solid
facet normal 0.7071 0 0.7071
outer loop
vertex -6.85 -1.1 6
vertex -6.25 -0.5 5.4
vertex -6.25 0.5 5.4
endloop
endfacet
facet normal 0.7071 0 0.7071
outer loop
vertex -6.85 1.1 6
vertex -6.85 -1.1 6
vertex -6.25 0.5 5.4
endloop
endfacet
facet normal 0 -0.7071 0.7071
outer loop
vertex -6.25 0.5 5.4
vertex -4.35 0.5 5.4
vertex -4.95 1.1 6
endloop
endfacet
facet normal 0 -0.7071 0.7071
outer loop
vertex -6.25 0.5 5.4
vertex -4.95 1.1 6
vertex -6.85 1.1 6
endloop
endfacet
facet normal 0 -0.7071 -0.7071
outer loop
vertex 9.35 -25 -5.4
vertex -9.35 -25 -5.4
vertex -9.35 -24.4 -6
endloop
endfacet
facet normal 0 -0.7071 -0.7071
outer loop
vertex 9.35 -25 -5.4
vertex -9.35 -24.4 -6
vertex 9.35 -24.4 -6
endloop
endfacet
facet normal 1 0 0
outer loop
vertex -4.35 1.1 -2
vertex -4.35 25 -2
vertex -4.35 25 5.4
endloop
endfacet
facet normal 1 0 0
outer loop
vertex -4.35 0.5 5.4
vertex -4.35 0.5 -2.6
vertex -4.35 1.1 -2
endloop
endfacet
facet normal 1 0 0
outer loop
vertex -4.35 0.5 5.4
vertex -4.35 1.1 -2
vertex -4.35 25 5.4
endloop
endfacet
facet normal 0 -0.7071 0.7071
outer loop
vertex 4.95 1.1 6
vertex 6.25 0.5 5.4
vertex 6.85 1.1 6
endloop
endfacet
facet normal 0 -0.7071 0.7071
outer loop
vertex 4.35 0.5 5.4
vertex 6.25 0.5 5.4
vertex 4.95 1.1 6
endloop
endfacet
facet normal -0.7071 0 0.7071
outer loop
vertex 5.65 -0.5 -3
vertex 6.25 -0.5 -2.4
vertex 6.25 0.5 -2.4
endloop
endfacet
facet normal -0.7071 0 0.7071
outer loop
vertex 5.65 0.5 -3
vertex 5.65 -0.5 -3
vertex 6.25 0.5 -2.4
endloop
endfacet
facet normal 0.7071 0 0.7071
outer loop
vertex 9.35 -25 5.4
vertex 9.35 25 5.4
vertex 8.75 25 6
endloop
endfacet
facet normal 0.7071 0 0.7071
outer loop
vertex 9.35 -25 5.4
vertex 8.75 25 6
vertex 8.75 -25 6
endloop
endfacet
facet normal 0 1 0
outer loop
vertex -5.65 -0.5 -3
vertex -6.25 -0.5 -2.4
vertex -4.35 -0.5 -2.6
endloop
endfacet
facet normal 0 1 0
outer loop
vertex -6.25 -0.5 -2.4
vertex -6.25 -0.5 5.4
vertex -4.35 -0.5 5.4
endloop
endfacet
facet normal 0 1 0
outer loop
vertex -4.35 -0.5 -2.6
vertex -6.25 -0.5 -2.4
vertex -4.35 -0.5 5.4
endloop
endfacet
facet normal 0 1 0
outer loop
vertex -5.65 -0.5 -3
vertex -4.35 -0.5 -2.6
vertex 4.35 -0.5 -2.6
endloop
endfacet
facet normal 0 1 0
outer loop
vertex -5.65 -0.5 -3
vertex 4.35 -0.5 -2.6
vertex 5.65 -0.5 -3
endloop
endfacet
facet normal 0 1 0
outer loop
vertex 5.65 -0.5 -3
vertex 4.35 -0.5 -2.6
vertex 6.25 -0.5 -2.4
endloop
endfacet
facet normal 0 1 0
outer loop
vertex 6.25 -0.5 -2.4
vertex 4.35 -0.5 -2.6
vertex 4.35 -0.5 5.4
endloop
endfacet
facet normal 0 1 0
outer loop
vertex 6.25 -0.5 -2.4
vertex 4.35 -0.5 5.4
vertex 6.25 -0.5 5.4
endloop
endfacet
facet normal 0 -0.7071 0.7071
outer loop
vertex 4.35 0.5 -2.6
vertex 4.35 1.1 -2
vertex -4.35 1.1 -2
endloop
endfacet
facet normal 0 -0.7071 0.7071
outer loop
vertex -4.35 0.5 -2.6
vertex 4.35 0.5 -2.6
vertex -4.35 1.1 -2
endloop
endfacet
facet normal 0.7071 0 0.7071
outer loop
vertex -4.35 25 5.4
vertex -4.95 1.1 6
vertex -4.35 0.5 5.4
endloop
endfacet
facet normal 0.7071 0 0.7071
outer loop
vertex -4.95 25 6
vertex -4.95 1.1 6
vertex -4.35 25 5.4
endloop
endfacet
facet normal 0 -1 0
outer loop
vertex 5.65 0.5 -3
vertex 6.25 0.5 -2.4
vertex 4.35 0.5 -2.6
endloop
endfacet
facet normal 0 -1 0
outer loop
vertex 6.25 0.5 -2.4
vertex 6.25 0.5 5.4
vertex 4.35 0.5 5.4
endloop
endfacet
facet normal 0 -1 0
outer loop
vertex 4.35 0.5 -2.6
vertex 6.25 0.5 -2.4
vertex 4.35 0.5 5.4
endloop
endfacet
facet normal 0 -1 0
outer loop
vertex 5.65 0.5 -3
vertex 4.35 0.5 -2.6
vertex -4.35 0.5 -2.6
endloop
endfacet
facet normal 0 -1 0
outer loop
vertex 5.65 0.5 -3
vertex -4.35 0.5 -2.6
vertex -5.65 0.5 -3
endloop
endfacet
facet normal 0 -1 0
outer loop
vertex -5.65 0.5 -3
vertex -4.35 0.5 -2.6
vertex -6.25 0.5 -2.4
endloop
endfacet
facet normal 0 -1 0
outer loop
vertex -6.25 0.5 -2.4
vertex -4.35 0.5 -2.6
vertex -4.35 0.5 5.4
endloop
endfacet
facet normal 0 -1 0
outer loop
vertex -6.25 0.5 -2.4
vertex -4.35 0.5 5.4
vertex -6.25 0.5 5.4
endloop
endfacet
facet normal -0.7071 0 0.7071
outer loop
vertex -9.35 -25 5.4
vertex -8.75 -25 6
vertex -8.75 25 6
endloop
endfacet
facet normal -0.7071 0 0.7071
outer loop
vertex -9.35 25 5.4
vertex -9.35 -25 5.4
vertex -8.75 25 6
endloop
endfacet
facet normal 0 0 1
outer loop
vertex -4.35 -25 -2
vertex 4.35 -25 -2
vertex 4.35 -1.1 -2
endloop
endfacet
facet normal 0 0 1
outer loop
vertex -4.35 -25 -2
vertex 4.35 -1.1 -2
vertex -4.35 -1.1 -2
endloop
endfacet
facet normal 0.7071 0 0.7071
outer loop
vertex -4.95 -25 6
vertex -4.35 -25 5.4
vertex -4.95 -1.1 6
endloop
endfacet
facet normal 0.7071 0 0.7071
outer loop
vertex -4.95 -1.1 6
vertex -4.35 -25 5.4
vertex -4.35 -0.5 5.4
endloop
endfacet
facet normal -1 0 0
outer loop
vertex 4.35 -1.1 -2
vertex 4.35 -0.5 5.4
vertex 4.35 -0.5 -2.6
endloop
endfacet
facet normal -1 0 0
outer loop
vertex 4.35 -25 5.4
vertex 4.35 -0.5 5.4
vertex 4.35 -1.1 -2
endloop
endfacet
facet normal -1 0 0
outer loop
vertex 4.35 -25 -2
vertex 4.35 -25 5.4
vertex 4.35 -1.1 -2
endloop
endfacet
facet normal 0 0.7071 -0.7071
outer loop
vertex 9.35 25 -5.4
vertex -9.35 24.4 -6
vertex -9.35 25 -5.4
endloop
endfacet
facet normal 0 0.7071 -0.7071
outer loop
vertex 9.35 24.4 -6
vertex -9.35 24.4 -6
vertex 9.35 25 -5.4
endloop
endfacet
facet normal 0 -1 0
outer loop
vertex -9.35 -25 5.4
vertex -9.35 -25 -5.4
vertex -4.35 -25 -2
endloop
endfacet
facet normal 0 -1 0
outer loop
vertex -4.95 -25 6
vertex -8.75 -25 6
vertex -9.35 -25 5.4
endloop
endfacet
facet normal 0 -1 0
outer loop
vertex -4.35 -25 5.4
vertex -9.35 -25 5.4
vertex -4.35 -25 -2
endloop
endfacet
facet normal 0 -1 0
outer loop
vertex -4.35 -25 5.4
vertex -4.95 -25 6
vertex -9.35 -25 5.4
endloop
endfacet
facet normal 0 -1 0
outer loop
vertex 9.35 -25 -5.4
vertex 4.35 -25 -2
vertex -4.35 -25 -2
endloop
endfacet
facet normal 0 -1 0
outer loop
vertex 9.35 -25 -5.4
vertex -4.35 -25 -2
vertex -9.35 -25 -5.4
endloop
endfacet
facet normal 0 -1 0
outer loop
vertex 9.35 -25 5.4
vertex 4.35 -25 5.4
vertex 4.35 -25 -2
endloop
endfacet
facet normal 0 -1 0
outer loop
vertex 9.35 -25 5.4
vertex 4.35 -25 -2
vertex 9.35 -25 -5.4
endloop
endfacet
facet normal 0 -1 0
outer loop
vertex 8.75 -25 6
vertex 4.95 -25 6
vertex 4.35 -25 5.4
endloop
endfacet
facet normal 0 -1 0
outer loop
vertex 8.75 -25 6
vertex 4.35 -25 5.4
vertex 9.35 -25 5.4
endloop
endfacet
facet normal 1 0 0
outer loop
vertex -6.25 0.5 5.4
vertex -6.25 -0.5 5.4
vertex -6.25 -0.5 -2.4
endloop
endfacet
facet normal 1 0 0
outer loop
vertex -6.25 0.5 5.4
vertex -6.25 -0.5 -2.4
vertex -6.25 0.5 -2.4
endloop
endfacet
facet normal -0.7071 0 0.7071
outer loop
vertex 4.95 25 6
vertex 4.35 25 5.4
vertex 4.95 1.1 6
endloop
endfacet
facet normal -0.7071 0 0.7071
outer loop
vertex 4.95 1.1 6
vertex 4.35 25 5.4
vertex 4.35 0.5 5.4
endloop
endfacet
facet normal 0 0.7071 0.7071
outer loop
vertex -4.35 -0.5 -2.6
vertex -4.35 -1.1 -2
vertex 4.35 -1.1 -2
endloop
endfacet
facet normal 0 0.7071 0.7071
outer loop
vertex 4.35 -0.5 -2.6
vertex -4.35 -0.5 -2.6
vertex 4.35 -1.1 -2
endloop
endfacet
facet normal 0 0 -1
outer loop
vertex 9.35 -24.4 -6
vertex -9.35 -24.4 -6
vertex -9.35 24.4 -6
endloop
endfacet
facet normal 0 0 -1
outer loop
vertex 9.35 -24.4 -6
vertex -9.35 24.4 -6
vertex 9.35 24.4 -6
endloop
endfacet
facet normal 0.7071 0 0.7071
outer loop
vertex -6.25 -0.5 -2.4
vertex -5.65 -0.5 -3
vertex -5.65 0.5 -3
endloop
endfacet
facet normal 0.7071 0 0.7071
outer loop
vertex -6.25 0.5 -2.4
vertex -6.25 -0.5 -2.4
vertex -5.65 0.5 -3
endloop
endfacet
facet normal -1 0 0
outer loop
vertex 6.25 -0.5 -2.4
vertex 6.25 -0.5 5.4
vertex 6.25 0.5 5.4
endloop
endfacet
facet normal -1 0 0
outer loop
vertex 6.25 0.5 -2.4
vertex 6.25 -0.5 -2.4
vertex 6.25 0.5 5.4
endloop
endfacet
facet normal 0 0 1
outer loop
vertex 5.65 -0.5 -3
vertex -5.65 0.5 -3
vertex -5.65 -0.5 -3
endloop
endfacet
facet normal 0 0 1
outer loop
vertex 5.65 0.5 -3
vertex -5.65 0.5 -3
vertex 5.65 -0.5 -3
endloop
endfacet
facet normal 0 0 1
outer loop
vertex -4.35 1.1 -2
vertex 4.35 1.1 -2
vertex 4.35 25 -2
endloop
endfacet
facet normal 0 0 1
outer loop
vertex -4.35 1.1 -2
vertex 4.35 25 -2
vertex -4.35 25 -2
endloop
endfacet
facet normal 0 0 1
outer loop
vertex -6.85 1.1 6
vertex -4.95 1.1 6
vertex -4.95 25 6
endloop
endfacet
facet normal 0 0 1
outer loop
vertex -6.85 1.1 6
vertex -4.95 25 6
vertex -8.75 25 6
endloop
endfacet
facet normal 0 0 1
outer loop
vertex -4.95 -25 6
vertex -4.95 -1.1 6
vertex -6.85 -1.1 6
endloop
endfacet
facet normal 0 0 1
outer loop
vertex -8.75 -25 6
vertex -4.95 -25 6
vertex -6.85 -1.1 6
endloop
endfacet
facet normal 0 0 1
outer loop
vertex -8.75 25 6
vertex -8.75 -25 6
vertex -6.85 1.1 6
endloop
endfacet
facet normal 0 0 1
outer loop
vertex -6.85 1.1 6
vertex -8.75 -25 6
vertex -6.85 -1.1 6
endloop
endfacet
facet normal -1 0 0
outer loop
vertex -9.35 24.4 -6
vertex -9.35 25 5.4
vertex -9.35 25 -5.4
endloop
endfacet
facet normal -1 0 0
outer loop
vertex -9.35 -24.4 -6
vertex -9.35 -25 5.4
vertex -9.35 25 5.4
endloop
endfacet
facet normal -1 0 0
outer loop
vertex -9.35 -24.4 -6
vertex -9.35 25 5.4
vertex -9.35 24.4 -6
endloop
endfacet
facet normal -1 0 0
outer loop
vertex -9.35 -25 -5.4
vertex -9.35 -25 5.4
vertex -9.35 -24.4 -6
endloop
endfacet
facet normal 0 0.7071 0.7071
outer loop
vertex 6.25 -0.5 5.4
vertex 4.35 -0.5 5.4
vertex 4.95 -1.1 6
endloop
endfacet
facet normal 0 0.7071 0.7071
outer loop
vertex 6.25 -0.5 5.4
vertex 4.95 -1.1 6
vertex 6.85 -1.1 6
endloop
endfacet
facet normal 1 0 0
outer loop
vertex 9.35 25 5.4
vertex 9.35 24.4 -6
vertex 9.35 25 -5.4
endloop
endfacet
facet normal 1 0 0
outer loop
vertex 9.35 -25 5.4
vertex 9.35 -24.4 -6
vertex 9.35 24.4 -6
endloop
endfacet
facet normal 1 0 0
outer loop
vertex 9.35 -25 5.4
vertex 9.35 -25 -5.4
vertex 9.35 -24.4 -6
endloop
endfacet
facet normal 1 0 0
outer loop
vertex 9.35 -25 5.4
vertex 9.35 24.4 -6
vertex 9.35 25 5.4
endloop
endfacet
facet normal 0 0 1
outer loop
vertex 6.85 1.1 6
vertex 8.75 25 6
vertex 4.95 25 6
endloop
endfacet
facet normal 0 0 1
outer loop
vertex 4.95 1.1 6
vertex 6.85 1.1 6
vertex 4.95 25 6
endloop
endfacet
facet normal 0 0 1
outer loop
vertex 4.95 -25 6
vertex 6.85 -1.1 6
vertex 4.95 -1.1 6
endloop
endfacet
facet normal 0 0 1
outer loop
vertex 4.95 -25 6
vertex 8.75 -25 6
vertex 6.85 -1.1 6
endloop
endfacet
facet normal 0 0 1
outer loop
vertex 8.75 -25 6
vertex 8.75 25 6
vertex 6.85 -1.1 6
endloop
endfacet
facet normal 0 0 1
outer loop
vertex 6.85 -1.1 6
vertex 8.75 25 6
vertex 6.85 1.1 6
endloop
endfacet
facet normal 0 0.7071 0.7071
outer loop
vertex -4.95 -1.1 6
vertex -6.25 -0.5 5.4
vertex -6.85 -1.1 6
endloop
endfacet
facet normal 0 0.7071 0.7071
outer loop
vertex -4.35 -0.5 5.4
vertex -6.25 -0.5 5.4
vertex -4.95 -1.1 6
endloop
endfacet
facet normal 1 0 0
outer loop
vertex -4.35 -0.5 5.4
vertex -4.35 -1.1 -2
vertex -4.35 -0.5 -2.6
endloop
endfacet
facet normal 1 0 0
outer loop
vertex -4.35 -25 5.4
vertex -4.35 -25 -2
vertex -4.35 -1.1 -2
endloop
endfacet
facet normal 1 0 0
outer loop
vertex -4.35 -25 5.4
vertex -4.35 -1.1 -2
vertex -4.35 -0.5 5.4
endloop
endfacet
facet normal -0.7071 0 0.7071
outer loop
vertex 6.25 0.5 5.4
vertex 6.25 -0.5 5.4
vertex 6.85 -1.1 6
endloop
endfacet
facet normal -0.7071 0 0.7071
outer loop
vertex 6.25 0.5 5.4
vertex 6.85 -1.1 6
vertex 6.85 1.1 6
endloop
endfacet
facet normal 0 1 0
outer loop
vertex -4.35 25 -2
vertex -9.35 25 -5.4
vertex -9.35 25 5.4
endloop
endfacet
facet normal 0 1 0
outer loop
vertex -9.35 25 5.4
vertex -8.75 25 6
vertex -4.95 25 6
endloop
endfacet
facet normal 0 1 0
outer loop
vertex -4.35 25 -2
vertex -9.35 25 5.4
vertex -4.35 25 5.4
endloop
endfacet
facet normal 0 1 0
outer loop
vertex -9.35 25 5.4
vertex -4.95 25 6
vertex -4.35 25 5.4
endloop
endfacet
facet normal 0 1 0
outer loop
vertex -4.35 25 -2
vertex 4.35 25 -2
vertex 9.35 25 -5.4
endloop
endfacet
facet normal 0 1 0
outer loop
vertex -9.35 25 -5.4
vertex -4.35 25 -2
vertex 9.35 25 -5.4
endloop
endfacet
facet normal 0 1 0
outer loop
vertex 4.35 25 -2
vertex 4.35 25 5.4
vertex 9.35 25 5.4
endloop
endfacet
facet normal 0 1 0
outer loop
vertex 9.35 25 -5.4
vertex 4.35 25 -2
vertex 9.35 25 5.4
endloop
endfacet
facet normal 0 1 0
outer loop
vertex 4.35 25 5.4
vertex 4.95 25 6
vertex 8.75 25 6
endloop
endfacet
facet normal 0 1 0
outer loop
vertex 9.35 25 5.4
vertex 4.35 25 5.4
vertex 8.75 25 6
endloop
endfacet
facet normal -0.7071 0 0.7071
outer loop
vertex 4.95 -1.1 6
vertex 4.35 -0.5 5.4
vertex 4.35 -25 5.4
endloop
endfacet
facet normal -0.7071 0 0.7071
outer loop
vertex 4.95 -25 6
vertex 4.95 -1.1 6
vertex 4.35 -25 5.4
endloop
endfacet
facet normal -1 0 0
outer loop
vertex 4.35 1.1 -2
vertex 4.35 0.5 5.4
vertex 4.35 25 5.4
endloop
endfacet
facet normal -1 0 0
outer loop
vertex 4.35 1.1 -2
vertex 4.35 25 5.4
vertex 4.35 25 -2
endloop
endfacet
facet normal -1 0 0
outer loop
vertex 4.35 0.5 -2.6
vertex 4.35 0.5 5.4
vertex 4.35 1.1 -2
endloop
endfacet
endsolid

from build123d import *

# Parameters (mm, degrees)
F1_DEPTH = 25
F2_W     = 1.9
F2_H     = 1
F2_W_2   = 10.6
F3_DEPTH = 9
F4_SIZE  = 0.6


with BuildPart() as f1:
    # F0 (on Front) → F1 (new body, symmetric)
    with BuildSketch(Plane.XZ):
        Polygon((-9.35, -6), (9.35, -6), (9.35, 6), (4.35, 6), (4.35, -2), (-4.35, -2), (-4.35, 6), (-9.35, 6), align=None)
    extrude(amount=F1_DEPTH, both=True)

    # F2 (on face) → F3 (cut)
    with BuildSketch(Plane.XY.offset(6)):
        with Locations((5.3, 0)):
            Rectangle(F2_W, F2_H)
        with Locations((-0.95, 0)):
            Rectangle(F2_W_2, F2_H)
    extrude(amount=-F3_DEPTH, mode=Mode.SUBTRACT)

    # F4 (call 1 of 10: OpenCascade refuses the feature's edges together)
    f4_edges = [f1.edges().sort_by_distance(p)[0] for p in [
        (5.3, 0.5, 6),
        (6.25, 0, 6),
        (5.3, -0.5, 6),
        (4.35, 12.75, 6),
        (4.35, -12.75, 6),
    ]]
    chamfer(f4_edges, length=F4_SIZE)

    # F4#2 (call 2 of 10)
    f4_2_edges = [f1.edges().sort_by_distance(p)[0] for p in [
        (-5.3, 0.5, 6),
        (-6.25, 0, 6),
        (-5.3, -0.5, 6),
        (-4.35, -12.75, 6),
        (-4.35, 12.75, 6),
    ]]
    chamfer(f4_2_edges, length=F4_SIZE)

    # F4#3 (call 3 of 10)
    f4_3_edges = [f1.edges().sort_by_distance(p)[0] for p in [
        (9.35, 0, 6),
    ]]
    chamfer(f4_3_edges, length=F4_SIZE)

    # F4#4 (call 4 of 10)
    f4_4_edges = [f1.edges().sort_by_distance(p)[0] for p in [
        (-9.35, 0, 6),
    ]]
    chamfer(f4_4_edges, length=F4_SIZE)

    # F4#5 (call 5 of 10)
    f4_5_edges = [f1.edges().sort_by_distance(p)[0] for p in [
        (0, 25, -6),
    ]]
    chamfer(f4_5_edges, length=F4_SIZE)

    # F4#6 (call 6 of 10)
    f4_6_edges = [f1.edges().sort_by_distance(p)[0] for p in [
        (0, -25, -6),
    ]]
    chamfer(f4_6_edges, length=F4_SIZE)

    # F4#7 (call 7 of 10)
    f4_7_edges = [f1.edges().sort_by_distance(p)[0] for p in [
        (-6.25, 0, -3),
    ]]
    chamfer(f4_7_edges, length=F4_SIZE)

    # F4#8 (call 8 of 10)
    f4_8_edges = [f1.edges().sort_by_distance(p)[0] for p in [
        (6.25, 0, -3),
    ]]
    chamfer(f4_8_edges, length=F4_SIZE)

    # F4#9 (call 9 of 10)
    f4_9_edges = [f1.edges().sort_by_distance(p)[0] for p in [
        (0, 0.5, -2),
    ]]
    chamfer(f4_9_edges, length=F4_SIZE)

    # F4#10 (call 10 of 10)
    f4_10_edges = [f1.edges().sort_by_distance(p)[0] for p in [
        (0, -0.5, -2),
    ]]
    chamfer(f4_10_edges, length=F4_SIZE)


solid = f1.part
